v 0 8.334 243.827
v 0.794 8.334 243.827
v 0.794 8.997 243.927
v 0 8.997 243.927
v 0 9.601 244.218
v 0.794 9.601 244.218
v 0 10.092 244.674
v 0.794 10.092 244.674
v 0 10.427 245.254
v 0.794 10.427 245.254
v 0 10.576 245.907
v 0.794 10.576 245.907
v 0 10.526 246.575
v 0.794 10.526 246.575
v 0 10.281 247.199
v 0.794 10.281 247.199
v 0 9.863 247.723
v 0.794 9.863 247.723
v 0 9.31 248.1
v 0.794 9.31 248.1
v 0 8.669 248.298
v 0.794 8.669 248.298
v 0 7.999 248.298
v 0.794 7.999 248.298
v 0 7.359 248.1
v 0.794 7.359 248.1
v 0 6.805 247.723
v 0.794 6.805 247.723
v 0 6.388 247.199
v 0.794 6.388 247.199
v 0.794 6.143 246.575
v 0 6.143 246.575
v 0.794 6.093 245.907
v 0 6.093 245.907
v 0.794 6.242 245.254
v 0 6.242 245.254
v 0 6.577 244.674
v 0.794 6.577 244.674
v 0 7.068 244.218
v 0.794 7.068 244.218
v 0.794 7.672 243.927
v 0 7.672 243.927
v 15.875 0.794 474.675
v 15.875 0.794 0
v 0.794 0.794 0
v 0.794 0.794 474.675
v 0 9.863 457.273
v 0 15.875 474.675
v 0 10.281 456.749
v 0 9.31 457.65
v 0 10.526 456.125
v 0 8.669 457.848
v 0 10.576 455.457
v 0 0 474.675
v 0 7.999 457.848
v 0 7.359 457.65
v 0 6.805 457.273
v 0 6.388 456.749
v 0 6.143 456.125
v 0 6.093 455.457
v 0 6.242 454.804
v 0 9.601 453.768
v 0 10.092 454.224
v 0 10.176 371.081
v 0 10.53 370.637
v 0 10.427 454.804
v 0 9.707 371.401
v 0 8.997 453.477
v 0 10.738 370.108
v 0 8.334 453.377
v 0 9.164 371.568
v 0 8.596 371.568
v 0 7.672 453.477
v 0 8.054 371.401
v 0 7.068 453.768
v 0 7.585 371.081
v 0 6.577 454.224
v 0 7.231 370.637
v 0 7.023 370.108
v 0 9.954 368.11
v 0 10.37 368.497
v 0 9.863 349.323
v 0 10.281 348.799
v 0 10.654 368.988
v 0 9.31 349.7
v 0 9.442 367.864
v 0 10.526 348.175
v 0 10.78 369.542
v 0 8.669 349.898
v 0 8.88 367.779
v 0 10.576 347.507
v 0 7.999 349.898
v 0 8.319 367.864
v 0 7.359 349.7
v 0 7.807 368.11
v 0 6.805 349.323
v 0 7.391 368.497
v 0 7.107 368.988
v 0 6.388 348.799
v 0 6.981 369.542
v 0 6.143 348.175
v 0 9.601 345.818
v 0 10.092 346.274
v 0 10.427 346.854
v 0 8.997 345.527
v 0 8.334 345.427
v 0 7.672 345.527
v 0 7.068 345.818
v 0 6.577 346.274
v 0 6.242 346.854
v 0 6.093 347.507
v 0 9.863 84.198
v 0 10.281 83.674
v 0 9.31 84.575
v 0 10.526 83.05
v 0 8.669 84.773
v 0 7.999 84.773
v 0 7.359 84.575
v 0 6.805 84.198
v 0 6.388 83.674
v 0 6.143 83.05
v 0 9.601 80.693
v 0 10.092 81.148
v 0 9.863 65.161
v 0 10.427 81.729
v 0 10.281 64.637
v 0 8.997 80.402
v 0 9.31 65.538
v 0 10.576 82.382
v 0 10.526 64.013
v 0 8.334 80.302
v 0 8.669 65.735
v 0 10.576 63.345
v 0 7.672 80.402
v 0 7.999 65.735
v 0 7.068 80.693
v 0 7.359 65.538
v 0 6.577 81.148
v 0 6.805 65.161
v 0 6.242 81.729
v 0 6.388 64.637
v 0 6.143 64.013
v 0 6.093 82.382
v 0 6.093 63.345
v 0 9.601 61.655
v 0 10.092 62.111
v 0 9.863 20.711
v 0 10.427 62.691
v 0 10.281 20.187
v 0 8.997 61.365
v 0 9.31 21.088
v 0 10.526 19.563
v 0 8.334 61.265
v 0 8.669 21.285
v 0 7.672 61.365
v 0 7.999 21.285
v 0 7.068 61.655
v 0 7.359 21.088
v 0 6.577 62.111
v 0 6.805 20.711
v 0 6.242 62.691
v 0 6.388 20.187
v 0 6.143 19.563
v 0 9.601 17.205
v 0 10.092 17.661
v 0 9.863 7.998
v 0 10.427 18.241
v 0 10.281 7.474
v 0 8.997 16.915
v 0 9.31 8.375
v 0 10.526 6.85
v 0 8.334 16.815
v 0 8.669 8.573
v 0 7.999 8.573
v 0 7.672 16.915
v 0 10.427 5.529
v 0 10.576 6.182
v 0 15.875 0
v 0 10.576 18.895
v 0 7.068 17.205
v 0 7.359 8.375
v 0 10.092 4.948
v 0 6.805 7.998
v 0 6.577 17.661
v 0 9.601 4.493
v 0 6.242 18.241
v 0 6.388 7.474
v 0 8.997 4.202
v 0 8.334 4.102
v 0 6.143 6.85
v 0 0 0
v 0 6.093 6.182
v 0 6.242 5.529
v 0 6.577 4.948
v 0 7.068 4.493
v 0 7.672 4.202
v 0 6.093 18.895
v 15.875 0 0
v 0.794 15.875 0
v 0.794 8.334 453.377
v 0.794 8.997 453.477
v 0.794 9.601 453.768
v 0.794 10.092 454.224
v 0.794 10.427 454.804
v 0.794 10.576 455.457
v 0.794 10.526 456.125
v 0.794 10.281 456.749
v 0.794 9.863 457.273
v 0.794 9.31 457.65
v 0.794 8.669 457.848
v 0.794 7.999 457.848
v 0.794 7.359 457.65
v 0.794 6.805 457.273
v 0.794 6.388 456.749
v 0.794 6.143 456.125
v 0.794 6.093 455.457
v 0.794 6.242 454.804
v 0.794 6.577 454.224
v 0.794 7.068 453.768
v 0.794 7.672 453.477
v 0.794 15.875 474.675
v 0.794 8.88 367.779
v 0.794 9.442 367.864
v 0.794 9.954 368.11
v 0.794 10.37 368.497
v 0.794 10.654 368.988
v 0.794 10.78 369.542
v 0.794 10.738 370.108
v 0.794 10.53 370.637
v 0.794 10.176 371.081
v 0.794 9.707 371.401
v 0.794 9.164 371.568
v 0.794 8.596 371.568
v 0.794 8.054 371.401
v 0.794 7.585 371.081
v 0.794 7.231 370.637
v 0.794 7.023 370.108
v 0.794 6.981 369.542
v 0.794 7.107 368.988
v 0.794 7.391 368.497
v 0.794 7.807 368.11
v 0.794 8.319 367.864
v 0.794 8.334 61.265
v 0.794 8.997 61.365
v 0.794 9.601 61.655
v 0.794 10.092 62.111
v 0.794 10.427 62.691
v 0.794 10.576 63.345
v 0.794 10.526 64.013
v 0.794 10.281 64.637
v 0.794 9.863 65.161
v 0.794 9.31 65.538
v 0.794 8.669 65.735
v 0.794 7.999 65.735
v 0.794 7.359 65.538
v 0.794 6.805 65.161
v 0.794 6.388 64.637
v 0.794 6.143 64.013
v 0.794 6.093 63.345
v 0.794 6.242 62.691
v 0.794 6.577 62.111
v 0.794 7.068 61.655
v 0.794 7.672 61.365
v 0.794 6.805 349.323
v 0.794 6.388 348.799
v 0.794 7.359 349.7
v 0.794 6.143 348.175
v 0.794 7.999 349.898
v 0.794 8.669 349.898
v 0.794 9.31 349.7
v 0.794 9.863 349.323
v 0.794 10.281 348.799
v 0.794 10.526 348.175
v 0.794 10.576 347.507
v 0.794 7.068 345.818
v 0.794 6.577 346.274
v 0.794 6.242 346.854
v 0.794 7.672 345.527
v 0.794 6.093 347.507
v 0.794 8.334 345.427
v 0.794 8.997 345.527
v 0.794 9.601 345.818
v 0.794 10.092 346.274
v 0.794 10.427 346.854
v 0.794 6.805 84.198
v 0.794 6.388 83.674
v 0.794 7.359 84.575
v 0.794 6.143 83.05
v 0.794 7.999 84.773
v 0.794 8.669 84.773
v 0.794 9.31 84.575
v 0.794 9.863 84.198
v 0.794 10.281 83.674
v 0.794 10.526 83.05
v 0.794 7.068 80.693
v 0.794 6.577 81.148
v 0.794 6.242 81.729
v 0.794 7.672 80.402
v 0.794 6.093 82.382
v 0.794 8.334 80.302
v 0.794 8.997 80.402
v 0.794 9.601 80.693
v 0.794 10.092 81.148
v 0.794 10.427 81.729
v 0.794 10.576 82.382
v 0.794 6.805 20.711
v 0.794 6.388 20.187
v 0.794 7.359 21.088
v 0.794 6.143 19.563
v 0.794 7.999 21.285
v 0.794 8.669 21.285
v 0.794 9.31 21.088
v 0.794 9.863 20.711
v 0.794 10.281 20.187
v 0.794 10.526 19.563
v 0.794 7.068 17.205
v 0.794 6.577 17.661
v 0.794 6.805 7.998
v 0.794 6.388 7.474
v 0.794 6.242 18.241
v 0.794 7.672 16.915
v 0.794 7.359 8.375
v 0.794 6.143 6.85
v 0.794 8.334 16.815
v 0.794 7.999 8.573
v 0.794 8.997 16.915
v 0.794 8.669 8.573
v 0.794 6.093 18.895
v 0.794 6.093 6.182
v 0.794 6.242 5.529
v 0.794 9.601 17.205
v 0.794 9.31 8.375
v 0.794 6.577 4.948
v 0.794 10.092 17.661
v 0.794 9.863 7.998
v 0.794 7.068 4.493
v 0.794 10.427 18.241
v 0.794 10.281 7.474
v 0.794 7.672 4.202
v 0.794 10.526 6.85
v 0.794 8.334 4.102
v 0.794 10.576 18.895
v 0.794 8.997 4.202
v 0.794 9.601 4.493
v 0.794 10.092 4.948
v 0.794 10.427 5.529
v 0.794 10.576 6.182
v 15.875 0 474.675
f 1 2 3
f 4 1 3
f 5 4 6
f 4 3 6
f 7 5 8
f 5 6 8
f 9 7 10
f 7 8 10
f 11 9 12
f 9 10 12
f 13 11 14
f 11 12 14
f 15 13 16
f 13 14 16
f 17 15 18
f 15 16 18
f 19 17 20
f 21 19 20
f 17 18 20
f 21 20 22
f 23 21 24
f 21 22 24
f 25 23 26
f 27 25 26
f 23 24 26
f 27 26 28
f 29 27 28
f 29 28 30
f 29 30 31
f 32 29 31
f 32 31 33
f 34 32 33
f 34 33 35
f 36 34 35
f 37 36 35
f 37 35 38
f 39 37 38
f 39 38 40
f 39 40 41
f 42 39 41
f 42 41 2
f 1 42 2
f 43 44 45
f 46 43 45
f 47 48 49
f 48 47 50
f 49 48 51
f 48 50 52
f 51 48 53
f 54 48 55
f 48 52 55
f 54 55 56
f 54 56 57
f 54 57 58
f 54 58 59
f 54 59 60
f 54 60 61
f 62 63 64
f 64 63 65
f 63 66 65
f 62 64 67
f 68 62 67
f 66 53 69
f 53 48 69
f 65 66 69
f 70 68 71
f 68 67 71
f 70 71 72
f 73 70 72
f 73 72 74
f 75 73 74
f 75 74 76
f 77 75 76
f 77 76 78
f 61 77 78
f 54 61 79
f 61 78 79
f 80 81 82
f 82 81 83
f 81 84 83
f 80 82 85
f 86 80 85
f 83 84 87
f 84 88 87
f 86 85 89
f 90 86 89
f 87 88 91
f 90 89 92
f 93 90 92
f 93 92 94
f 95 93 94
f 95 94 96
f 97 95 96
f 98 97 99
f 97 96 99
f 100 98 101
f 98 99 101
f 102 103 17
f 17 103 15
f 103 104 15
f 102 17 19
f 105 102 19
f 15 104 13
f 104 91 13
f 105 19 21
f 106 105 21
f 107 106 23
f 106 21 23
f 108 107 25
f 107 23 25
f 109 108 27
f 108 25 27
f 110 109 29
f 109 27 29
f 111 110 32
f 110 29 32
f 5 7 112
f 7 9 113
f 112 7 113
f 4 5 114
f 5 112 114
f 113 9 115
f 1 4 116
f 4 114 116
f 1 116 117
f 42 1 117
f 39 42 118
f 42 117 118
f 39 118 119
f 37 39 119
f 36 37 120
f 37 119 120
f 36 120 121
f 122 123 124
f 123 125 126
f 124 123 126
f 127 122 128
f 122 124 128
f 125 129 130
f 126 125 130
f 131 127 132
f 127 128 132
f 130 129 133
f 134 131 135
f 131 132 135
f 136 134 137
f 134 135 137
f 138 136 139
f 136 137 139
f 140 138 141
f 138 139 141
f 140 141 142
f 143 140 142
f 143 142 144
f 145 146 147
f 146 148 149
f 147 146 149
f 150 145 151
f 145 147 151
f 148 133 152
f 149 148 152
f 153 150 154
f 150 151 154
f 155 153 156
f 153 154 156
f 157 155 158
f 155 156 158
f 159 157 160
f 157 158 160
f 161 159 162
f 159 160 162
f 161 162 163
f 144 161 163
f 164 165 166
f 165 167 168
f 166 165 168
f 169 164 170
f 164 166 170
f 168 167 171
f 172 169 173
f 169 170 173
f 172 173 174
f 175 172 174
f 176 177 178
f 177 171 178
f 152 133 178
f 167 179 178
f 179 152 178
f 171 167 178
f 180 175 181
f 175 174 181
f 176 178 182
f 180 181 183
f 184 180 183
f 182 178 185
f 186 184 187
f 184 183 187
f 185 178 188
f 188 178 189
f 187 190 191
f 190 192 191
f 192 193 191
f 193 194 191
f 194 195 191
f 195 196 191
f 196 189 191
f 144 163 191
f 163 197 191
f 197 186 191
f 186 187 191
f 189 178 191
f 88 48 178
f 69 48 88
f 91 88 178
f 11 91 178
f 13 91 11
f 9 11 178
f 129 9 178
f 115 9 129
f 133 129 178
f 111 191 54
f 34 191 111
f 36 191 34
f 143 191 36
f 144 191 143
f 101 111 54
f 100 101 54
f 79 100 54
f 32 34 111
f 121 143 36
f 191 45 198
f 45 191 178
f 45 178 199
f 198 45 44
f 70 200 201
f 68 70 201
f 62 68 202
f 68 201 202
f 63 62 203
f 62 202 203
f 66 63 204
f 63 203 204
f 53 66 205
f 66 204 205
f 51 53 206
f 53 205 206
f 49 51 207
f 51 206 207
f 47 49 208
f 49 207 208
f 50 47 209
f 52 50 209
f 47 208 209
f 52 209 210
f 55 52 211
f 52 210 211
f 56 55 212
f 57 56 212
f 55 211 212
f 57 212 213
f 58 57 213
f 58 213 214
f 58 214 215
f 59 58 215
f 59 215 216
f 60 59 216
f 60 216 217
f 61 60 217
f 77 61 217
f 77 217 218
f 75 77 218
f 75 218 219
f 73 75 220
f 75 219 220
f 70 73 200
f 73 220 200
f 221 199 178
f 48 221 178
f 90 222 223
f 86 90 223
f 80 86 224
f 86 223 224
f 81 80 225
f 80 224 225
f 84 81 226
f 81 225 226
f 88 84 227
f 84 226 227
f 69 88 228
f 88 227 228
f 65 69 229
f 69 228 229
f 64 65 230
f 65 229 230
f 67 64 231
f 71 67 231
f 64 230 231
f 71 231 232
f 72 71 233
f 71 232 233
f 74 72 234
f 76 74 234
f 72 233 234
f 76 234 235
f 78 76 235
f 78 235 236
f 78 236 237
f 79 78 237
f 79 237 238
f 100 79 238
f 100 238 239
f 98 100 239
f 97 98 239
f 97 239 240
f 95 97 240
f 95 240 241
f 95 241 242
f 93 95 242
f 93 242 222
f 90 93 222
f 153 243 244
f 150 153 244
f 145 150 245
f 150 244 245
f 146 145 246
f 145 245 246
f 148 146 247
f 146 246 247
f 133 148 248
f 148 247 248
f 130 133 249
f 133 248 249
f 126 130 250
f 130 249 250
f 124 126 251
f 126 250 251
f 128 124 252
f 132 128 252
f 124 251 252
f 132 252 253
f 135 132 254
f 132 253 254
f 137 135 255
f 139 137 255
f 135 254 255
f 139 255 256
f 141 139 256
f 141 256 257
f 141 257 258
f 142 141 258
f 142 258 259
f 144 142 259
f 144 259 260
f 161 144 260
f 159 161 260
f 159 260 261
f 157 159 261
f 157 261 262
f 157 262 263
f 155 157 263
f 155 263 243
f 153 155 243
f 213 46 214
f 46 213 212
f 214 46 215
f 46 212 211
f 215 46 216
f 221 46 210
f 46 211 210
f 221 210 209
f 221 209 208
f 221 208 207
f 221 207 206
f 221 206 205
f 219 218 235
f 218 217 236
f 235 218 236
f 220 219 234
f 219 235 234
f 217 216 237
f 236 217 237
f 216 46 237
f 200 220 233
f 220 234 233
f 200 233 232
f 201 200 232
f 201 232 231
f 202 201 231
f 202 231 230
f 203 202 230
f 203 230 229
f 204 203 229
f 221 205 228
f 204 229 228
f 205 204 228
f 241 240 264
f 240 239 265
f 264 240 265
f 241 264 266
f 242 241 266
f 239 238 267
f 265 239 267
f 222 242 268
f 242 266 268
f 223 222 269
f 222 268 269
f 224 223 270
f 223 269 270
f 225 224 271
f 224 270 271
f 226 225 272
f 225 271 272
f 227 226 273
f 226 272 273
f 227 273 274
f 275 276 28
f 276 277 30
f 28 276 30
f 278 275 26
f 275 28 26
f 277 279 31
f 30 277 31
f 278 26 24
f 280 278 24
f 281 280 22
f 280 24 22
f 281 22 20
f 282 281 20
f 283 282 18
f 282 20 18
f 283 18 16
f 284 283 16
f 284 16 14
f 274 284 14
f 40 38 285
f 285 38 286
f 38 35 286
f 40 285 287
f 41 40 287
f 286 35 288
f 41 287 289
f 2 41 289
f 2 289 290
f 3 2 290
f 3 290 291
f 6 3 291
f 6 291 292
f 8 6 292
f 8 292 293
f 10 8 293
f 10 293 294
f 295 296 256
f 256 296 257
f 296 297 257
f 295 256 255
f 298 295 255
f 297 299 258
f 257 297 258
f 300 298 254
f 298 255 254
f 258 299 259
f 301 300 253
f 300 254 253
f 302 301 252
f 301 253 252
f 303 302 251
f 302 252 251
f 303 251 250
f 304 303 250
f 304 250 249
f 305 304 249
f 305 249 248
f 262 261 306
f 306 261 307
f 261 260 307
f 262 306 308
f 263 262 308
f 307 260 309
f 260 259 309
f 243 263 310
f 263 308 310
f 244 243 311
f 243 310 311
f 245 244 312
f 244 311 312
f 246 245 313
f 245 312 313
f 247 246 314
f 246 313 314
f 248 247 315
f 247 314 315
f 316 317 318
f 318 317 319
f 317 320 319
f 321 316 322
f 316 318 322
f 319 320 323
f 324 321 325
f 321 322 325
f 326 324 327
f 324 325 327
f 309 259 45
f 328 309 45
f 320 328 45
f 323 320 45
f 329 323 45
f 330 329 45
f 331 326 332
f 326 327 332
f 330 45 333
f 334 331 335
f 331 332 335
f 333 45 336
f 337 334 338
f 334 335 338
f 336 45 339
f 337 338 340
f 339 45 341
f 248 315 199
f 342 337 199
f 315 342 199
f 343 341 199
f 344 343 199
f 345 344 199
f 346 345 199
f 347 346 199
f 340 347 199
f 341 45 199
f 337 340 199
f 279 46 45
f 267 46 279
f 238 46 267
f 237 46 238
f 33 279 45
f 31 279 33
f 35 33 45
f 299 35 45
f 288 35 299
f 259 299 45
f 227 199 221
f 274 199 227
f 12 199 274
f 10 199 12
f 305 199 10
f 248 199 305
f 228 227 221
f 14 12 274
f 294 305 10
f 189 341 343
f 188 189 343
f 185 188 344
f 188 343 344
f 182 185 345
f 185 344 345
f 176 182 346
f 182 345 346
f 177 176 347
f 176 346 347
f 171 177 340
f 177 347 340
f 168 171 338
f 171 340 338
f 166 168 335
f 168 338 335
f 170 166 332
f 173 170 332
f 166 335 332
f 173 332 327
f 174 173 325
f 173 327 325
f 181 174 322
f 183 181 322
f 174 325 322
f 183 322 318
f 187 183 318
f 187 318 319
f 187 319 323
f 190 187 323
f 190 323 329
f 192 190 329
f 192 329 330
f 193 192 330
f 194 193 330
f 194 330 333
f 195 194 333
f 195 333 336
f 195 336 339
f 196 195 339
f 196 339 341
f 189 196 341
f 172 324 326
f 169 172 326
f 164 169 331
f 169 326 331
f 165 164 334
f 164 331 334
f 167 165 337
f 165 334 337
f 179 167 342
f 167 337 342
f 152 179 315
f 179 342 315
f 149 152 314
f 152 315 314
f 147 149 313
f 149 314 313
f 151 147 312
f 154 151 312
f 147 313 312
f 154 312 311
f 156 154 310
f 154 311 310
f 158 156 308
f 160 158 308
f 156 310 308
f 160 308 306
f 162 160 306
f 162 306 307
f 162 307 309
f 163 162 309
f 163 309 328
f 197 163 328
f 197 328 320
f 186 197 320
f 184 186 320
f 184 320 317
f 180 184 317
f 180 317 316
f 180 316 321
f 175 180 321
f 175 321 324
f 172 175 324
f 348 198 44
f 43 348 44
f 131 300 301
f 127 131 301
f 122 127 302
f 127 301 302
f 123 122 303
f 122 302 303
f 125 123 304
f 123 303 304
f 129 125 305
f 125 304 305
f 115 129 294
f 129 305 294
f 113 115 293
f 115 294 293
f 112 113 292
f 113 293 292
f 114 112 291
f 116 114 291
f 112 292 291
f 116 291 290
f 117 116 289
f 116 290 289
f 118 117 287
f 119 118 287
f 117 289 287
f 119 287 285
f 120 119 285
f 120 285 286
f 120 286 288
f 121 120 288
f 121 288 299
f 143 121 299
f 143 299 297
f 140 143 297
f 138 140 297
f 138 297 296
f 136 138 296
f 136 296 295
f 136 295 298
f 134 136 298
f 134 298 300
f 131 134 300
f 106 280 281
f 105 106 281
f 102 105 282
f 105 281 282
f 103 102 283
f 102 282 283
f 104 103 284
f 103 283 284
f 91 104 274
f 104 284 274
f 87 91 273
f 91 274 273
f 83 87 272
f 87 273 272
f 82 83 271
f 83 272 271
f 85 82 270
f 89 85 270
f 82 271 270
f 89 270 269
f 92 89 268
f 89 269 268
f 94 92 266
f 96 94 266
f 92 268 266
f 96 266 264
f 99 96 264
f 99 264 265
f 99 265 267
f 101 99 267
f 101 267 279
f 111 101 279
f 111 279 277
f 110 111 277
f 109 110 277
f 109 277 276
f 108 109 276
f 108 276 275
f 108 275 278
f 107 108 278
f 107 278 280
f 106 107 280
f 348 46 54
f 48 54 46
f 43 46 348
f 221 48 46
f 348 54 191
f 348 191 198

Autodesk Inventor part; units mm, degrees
ref_plane "YZ Plane" through (0, 0, 0) normal (1, 0, 0) x (0, 1, 0)
ref_plane "XZ Plane" through (0, 0, 0) normal (0, 1, 0) x (-1, 0, 0)
ref_plane "XY Plane" through (0, 0, 0) normal (0, 0, 1) x (1, 0, 0)
sketch "Sketch1" plane through (0, 0, 0) normal (0, 0, 1) x (1, 0, 0)
  line L0 (0, 0) -> (15.875, 0)
  line L1 (15.875, 0) -> (15.875, 0.7937)
  line L2 (15.875, 0.7937) -> (0.7938, 0.7937)
  line L3 (0.7938, 0.7937) -> (0.7937, 15.875)
  line L4 (0.7937, 15.875) -> (0, 15.875)
  line L5 (0, 15.875) -> (0, 0)
  dimension "d0" = 15.875
  dimension "d1" = 0.7937
  dimension "d2" = 0.7937
extrude "Extrusion1" add sketch "Sketch1" along normal blind 474.6752
sketch "Sketch2" plane through (0.7937, 0.7937, 0) normal (1, 0, 0) x (0, 0, -1)
  line L0 (0, 0) -> (0, 15.0812) projected
  line L1 (-474.6752, 0) -> (-474.6752, 15.0812) projected
  circle A0 centre (-19.0627, 7.5406) radius 2.2479 projected
  circle A1 centre (-63.5127, 7.5406) radius 2.2479 projected
  line L2 (0, 7.5406) -> (-474.6752, 7.5406) construction
  circle A2 centre (-6.35, 7.5406) radius 2.2479
  circle A3 centre (-82.55, 7.5406) radius 2.2479
  circle A4 centre (-246.0752, 7.5406) radius 2.2479
  circle A5 centre (-455.6252, 7.5406) radius 2.2479
  circle A6 centre (-347.6752, 7.5406) radius 2.2479
  circle A7 centre (-369.6843, 8.0867) radius 1.905 projected
  point P0 (0, -0.7937)
  dimension "d5" = 4.4958
  dimension "d8" = 19.05
  dimension "d9" = 127
  dimension "d10" = 228.6
  dimension "d11" = 6.35
  dimension "d12" = 82.55
extrude "Extrusion2" cut sketch "Sketch2" against normal through all
properties part number "Electrical Board 1 Bracing L Channel" material "Aluminum 6061"
